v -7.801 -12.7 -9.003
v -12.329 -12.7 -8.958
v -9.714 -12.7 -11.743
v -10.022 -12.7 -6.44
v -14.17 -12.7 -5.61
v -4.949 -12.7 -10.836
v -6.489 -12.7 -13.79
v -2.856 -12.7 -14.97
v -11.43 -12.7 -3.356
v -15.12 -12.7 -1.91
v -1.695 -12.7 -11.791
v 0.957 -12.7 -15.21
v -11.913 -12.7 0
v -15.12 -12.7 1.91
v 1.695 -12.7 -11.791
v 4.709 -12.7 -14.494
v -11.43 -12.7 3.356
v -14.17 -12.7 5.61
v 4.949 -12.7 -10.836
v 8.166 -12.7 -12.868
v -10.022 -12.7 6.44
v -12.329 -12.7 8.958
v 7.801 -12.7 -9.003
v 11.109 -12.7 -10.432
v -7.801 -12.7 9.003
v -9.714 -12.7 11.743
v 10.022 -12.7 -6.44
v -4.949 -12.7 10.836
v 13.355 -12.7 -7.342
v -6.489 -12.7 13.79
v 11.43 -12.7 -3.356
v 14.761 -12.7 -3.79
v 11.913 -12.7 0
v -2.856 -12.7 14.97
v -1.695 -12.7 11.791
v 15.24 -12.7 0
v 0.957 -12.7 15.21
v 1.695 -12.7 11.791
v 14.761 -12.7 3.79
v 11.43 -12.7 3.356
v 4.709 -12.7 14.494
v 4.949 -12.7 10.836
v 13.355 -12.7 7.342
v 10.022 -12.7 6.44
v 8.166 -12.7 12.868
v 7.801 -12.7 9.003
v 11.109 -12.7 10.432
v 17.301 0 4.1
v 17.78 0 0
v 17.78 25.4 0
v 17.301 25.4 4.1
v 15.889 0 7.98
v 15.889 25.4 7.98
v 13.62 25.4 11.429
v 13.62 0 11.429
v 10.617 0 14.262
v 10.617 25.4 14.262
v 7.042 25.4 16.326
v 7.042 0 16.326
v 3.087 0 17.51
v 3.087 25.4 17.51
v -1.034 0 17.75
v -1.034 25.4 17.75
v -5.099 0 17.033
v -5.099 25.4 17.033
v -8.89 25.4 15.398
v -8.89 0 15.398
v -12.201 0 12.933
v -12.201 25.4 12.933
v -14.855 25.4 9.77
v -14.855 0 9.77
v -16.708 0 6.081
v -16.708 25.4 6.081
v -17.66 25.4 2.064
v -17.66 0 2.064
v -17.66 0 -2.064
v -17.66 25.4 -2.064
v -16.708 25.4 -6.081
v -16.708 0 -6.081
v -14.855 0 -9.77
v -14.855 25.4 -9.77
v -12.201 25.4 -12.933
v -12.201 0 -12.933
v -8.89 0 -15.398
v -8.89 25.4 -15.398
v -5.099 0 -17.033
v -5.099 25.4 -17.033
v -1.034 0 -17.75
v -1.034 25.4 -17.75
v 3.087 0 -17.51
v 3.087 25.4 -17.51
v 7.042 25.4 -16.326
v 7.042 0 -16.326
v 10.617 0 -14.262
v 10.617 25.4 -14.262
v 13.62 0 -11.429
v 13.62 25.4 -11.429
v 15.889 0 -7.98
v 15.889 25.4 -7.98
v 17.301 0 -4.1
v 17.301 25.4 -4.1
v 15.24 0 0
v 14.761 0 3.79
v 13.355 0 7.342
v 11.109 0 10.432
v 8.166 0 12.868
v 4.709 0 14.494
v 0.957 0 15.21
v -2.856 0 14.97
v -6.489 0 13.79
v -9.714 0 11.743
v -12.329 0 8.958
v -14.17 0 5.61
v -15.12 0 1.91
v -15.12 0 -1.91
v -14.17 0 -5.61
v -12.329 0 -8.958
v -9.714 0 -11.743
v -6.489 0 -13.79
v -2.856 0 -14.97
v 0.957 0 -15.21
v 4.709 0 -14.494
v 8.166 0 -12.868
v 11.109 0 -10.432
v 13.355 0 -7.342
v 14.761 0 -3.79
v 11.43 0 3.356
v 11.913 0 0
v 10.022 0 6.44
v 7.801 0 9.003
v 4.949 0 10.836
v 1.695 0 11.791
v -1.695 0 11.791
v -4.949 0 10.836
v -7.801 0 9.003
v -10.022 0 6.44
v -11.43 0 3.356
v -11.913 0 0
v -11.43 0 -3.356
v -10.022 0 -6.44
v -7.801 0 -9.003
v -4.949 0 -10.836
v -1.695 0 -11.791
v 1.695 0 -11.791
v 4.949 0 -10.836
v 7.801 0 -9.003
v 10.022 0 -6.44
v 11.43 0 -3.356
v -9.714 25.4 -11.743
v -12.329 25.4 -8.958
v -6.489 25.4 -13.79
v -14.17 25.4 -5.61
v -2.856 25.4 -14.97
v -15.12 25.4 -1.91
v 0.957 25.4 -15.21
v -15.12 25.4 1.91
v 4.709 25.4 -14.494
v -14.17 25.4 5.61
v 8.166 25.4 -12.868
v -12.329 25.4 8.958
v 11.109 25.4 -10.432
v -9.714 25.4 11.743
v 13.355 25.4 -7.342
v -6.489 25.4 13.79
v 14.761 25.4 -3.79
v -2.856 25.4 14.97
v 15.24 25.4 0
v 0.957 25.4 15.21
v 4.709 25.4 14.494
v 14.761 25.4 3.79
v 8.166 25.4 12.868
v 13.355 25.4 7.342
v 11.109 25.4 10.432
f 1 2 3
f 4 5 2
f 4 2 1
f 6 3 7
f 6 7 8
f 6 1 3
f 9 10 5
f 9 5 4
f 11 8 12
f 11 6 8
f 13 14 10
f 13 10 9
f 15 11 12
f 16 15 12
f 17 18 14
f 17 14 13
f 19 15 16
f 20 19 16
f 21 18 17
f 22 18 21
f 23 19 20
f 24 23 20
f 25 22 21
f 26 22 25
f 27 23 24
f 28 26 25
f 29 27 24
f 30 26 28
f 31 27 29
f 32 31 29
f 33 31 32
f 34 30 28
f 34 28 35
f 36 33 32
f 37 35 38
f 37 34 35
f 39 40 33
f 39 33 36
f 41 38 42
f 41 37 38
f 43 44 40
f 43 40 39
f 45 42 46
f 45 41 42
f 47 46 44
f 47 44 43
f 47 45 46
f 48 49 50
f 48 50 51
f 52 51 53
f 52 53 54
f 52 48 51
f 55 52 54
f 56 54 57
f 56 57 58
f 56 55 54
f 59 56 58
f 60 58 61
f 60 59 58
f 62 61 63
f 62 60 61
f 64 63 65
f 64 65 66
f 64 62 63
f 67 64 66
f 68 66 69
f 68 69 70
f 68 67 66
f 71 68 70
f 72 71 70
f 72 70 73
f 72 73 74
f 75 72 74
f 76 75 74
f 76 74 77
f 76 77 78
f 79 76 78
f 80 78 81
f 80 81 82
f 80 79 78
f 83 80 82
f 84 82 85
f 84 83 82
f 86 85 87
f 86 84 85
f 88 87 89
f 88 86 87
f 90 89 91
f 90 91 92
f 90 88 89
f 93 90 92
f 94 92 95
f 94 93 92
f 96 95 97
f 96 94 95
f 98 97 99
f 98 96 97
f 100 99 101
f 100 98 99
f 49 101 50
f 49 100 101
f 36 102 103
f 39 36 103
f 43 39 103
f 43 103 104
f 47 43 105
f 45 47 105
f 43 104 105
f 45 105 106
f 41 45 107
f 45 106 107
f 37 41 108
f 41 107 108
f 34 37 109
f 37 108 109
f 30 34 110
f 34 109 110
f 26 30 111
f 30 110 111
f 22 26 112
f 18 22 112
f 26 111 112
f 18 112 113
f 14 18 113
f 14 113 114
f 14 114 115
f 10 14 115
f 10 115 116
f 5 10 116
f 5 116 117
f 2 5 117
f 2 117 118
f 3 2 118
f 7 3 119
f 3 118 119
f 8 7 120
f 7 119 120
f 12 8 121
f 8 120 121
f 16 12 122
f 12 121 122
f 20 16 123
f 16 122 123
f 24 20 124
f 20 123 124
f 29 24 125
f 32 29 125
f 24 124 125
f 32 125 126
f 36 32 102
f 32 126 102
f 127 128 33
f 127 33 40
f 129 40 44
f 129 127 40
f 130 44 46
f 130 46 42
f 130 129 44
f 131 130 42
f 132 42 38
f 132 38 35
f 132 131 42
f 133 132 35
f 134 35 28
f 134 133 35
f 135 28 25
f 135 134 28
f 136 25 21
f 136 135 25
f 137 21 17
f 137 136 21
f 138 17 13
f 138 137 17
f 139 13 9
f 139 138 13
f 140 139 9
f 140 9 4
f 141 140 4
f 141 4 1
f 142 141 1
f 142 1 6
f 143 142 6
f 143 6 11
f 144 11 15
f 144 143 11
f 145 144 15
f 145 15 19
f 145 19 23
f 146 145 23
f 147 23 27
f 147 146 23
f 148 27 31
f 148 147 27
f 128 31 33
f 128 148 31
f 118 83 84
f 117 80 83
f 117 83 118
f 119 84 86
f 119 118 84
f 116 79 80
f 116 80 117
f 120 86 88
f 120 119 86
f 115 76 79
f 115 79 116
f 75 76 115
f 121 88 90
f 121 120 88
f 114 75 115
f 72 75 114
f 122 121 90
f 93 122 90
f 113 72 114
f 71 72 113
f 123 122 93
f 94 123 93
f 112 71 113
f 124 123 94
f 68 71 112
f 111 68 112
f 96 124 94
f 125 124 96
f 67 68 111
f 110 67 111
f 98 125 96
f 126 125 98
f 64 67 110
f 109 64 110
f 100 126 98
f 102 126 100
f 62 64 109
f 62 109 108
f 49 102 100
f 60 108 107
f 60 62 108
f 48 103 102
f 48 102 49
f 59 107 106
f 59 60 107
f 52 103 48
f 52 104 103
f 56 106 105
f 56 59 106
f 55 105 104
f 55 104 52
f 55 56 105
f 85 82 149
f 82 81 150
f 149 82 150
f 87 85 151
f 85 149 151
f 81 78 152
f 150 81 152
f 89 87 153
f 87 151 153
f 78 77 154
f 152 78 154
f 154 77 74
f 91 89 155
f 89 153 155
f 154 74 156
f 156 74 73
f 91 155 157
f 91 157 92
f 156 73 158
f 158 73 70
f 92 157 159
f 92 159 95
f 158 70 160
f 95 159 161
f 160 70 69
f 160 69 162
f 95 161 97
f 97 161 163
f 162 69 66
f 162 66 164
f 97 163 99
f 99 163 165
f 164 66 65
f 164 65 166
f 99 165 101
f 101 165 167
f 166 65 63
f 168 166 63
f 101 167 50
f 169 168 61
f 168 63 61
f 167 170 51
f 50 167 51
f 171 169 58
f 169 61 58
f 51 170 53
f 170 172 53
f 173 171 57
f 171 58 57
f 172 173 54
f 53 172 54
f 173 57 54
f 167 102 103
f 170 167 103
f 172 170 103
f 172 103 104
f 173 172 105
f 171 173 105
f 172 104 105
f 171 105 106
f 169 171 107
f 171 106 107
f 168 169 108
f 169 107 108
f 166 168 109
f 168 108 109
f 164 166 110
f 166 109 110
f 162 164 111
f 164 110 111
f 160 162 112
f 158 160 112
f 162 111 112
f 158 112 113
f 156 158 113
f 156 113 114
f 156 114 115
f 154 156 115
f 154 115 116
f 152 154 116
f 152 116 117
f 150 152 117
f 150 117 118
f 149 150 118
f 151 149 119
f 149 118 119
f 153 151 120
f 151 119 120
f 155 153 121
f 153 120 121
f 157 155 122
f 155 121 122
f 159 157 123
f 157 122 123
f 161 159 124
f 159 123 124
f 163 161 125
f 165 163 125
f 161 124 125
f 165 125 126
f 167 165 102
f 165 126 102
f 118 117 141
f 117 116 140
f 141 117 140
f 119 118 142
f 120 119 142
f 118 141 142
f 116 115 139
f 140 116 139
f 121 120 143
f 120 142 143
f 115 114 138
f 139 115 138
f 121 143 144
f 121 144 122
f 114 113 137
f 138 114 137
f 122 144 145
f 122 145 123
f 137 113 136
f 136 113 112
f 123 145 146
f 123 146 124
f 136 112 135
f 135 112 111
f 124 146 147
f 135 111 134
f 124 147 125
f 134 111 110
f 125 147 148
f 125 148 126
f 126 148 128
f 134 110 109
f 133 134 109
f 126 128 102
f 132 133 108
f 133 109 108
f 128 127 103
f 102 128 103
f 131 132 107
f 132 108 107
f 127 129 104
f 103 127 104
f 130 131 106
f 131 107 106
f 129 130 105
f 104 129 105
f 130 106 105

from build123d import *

# Parameters (mm, degrees)
F0_R     = 15.24
F0_R_2   = 11.9126
F1_DEPTH = 12.7
F2_R     = 17.78
F2_R_2   = 15.24
F3_DEPTH = 25.4


with BuildPart() as f1:
    # F0 (on Front) → F1 (new body)
    with BuildSketch(Plane.XZ):
        Circle(F0_R)
        Circle(F0_R_2, mode=Mode.SUBTRACT)
    extrude(amount=F1_DEPTH)


with BuildPart() as f3:
    # F2 (on Front) → F3 (new body)
    with BuildSketch(Plane.XZ):
        Circle(F2_R)
        Circle(F2_R_2, mode=Mode.SUBTRACT)
    extrude(amount=-F3_DEPTH)


solid = Compound([f1.part, f3.part])
